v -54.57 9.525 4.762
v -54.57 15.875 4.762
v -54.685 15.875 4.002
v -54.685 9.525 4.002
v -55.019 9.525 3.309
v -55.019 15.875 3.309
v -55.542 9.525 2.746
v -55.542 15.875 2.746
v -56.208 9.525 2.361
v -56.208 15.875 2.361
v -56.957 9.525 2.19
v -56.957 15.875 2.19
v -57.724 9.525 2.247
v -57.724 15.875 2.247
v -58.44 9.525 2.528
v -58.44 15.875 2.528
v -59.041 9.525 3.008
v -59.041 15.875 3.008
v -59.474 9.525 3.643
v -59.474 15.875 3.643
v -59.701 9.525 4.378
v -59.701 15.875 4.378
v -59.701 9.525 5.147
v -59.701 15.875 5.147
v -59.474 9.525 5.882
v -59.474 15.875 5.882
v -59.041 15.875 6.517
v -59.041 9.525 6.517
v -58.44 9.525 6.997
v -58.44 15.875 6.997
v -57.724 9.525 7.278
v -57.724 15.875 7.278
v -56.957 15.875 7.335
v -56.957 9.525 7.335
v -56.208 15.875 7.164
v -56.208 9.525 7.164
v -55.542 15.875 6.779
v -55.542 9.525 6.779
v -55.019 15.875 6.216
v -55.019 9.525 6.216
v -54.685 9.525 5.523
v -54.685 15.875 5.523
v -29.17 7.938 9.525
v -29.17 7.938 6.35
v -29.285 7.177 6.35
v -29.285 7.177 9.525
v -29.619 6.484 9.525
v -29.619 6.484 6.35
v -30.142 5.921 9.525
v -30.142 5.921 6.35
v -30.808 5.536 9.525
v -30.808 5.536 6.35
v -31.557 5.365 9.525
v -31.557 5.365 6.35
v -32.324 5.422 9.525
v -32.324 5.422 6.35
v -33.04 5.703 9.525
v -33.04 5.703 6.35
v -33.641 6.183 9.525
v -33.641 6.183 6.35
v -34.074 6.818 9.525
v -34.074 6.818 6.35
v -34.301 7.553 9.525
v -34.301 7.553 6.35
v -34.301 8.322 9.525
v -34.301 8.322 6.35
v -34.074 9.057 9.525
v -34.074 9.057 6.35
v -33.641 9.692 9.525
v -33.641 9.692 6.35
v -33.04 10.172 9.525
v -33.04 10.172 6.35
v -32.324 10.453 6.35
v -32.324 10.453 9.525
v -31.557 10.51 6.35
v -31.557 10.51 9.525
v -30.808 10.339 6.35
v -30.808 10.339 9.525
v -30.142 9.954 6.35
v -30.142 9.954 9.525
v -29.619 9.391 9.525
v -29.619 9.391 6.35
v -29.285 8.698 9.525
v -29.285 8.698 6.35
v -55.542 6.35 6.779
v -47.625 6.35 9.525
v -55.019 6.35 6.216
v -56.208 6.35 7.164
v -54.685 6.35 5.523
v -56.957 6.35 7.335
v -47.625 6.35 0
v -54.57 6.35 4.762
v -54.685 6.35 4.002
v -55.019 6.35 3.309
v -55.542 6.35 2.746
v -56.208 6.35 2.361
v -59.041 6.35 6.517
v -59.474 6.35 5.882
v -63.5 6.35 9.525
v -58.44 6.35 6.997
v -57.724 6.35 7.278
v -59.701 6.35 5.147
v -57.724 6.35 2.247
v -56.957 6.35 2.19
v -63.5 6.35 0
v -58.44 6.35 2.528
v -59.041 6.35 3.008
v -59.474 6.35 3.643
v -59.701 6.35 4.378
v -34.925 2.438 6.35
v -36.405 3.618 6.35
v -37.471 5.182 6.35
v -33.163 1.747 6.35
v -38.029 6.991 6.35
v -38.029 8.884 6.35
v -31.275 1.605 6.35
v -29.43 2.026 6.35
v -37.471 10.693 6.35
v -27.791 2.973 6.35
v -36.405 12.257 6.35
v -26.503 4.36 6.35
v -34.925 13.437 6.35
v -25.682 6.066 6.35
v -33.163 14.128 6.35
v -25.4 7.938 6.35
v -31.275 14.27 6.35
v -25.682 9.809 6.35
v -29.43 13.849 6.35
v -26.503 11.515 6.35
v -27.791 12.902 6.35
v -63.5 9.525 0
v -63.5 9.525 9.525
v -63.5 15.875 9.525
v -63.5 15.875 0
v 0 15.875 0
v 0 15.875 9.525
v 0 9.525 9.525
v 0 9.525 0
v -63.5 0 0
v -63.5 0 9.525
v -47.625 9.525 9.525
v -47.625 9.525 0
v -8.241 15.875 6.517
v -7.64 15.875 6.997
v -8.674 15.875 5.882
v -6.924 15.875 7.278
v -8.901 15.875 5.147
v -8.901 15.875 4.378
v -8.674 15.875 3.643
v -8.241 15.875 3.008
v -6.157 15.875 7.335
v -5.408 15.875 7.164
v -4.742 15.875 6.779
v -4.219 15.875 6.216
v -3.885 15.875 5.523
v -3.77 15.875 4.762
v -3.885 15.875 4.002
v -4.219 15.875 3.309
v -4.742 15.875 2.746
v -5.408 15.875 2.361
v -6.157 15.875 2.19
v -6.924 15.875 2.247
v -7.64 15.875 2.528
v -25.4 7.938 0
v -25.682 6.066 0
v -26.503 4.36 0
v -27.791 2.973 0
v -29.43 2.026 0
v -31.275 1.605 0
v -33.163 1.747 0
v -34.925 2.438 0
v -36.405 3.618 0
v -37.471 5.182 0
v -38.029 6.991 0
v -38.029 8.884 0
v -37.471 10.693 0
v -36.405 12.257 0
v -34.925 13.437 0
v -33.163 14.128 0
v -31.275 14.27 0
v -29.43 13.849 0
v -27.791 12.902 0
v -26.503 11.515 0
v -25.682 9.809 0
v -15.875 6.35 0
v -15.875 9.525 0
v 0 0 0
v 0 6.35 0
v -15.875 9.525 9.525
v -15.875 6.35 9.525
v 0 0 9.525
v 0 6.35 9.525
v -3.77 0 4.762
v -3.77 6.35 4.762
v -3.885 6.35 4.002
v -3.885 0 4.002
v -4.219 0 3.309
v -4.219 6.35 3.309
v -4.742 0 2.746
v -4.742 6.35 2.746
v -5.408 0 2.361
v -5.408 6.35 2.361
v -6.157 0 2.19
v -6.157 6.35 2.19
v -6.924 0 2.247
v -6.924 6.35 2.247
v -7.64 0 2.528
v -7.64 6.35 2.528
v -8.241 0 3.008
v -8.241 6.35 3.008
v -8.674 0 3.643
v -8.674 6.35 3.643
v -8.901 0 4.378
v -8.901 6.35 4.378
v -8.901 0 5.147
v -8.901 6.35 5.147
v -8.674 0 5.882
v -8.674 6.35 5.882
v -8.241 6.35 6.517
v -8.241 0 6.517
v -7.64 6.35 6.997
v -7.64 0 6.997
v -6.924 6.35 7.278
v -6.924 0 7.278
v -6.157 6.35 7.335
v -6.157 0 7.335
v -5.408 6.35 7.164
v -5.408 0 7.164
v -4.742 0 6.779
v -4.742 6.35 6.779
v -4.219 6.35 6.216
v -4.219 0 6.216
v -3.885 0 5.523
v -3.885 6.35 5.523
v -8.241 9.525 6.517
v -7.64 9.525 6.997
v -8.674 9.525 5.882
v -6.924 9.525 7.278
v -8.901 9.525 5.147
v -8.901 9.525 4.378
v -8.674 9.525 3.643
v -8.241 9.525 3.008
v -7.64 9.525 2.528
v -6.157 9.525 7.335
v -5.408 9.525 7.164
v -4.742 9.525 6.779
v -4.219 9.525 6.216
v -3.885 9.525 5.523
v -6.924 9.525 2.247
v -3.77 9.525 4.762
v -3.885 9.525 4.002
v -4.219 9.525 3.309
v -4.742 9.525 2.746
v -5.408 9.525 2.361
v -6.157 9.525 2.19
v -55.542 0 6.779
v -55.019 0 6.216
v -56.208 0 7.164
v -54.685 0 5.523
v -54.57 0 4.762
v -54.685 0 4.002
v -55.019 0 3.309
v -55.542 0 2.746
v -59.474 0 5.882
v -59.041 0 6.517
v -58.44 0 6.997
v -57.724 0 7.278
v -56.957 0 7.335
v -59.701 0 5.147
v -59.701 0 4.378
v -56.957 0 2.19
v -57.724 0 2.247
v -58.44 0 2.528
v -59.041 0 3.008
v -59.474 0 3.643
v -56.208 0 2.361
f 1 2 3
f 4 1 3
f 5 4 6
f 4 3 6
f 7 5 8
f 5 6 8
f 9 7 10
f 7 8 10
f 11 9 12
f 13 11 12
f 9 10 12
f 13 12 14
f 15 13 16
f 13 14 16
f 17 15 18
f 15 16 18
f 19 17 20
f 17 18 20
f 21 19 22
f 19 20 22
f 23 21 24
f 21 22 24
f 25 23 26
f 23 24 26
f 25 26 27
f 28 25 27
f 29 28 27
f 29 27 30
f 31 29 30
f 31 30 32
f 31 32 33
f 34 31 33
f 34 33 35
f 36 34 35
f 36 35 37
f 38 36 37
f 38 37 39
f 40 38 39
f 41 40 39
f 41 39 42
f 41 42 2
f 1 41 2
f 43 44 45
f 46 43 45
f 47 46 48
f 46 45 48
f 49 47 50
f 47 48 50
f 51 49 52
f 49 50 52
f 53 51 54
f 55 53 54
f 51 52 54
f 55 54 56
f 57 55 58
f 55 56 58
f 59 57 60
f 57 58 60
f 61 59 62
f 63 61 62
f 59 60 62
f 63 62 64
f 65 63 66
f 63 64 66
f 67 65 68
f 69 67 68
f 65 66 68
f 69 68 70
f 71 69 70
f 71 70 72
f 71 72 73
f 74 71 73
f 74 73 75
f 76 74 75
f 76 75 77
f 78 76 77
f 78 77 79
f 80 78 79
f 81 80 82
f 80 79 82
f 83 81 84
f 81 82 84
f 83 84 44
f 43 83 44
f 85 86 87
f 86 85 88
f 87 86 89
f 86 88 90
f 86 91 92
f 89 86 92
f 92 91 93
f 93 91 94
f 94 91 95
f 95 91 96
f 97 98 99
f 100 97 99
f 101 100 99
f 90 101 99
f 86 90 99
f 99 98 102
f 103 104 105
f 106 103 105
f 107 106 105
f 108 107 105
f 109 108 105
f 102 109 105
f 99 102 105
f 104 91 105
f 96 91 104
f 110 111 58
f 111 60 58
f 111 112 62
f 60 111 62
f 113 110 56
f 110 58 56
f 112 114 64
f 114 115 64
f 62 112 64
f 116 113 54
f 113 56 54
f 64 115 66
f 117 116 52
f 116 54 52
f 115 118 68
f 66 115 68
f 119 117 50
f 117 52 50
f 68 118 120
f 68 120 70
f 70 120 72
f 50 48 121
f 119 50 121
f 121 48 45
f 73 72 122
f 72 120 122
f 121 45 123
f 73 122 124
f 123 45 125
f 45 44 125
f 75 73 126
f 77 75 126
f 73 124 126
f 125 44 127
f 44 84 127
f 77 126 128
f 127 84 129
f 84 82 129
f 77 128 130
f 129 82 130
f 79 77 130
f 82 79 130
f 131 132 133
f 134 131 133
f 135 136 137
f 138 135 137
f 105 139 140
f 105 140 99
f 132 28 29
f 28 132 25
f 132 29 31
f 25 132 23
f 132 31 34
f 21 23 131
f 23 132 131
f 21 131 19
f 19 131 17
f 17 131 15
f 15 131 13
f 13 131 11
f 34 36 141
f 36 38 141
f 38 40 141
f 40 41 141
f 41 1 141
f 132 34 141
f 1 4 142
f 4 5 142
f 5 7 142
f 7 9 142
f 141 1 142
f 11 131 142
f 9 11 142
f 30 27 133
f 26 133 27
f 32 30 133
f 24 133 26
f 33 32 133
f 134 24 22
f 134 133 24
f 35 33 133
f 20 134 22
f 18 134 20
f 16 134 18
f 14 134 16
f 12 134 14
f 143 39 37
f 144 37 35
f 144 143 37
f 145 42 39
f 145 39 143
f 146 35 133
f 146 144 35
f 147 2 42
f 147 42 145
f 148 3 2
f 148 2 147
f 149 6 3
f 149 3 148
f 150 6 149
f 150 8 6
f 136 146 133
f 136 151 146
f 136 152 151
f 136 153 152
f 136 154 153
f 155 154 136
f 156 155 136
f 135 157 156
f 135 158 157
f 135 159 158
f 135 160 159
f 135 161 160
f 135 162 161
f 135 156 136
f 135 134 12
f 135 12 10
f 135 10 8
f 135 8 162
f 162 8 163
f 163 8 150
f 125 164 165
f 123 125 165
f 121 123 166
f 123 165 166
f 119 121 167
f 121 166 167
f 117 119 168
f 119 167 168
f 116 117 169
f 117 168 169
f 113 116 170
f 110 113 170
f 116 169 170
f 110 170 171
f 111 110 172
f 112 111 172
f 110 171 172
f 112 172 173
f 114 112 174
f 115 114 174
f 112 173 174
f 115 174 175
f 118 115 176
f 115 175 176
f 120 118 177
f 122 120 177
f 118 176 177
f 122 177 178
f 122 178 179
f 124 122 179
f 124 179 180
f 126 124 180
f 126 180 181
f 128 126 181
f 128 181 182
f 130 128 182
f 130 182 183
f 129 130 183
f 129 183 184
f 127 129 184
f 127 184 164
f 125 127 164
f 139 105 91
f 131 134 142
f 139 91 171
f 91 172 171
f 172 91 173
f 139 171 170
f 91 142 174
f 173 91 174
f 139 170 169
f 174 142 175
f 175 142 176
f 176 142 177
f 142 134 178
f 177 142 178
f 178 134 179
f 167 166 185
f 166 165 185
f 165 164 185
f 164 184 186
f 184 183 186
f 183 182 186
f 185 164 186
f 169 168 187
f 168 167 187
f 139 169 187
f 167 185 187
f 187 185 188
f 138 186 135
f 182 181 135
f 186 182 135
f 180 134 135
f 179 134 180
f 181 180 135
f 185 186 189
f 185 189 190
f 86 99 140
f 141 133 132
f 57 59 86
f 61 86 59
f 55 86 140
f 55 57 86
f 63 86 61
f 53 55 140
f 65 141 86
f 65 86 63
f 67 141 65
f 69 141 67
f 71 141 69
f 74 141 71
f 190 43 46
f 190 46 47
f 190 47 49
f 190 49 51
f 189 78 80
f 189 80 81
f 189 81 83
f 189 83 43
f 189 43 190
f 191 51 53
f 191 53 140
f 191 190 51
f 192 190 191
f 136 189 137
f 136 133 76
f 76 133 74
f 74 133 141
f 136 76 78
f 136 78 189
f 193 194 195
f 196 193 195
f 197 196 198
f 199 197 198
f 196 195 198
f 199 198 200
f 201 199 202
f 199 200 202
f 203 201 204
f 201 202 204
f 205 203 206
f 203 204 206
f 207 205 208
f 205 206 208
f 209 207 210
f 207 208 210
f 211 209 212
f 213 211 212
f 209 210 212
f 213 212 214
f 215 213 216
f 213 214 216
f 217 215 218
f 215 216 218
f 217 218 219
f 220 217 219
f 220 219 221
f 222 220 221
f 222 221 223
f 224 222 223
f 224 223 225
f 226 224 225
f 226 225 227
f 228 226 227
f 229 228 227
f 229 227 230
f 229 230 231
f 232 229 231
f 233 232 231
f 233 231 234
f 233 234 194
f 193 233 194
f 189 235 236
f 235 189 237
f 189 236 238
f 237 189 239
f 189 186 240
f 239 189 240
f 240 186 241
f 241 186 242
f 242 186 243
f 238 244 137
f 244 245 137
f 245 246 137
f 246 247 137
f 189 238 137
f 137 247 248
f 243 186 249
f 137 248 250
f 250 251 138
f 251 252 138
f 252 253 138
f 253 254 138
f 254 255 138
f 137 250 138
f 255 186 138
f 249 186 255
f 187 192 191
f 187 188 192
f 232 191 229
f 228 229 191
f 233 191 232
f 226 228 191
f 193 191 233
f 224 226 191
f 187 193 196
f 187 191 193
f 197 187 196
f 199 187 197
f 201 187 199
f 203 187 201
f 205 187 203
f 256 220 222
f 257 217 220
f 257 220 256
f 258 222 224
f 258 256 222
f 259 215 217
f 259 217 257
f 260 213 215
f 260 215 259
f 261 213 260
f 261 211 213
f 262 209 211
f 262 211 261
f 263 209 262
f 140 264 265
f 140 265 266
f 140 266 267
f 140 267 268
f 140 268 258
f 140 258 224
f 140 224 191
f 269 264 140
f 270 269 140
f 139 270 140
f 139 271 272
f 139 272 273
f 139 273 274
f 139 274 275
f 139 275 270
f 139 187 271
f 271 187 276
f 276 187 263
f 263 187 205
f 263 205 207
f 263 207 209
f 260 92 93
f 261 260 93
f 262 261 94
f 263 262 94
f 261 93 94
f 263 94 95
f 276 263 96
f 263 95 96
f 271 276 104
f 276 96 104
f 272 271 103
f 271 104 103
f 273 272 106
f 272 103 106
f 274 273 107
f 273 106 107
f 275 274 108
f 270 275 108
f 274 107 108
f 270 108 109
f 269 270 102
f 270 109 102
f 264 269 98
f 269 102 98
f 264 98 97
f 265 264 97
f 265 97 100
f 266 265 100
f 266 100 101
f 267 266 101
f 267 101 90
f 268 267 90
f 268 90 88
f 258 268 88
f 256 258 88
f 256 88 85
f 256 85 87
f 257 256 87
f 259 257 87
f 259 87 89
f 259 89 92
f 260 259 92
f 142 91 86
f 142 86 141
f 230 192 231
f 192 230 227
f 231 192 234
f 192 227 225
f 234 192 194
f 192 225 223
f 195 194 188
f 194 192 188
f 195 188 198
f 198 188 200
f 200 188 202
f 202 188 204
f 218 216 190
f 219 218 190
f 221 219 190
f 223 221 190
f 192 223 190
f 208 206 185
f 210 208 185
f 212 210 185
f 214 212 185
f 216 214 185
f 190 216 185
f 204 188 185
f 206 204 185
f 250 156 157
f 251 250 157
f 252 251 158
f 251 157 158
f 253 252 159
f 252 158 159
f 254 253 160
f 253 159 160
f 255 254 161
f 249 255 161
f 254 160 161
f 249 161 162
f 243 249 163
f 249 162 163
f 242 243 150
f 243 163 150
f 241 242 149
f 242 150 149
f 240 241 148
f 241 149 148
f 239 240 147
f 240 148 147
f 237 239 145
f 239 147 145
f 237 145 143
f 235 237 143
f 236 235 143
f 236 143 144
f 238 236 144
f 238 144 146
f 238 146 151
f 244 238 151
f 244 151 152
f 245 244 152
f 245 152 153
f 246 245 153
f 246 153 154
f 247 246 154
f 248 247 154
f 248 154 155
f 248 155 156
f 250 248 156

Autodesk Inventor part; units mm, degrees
ref_plane "YZ Plane" through (0, 0, 0) normal (1, 0, 0) x (0, 1, 0)
ref_plane "XZ Plane" through (0, 0, 0) normal (0, 1, 0) x (-1, 0, 0)
ref_plane "XY Plane" through (0, 0, 0) normal (0, 0, 1) x (1, 0, 0)
sketch "Sketch1" plane through (0, 0, 0) normal (0, 0, 1) x (1, 0, 0)
  line L0 (0, 0) -> (-63.5, 0)
  line L1 (-63.5, 0) -> (-63.5, 15.875)
  line L2 (-63.5, 15.875) -> (0, 15.875)
  line L3 (0, 15.875) -> (0, 0)
  line L4 (0, 6.35) -> (-63.5, 6.35)
  line L5 (-63.5, 6.35) -> (-63.5, 9.525)
  line L6 (-63.5, 9.525) -> (0, 9.525)
  line L7 (0, 9.525) -> (0, 6.35)
  line L8 (-47.625, 15.875) -> (-15.875, 15.875)
  line L9 (-15.875, 15.875) -> (-15.875, 0)
  line L10 (-15.875, 0) -> (-47.625, 0)
  line L11 (-47.625, 0) -> (-47.625, 15.875)
  circle A0 centre (-31.75, 7.9375) radius 6.35
  circle A1 centre (-31.75, 7.9375) radius 2.5797
  line L12 (-6.35, 6.35) -> (-6.35, 9.525)
  line L13 (-57.15, 6.35) -> (-57.15, 9.525)
  point P0 (-15.875, 6.35)
  point P1 (-15.875, 9.525)
  point P2 (-47.625, 9.525)
  point P3 (-47.625, 6.35)
  dimension "d12" = 15.875
  dimension "d13" = 6.35
  dimension "d14" = 3.175
  dimension "d15" = 15.875
  dimension "d16" = 15.875
  dimension "d17" = 7.9375
  dimension "d18" = 31.75
  dimension "d19" = 12.7
  dimension "d20" = 5.1594
  dimension "d33" = 6.35
  dimension "d34" = 6.35
  dimension "d35" = 50.8
  dimension "d36" = 63.5
extrude "Extrusion1" add sketch "Sketch1" along normal blind 9.525 contours L0 L9 L4 L3 | L0 L11 L4 A0 L9 | L0 L1 L4 L11 | L4 A0 L6 L9 | L6 L9 L2 L3 | L11 L6 A0 L4 | A0 L4 A1 | L4 A1 L6 A0 | L6 A0 L11 L2 L9 | A0 L6 A1 L4 | L6 L1 L2 L11 | L6 A1 A0
extrude "Extrusion2" cut sketch "Sketch1" along normal blind 6.35 contours A0 L4 A1 | L4 A1 L6 A0 | A0 L6 A1 L4 | A1 L4 | L4 A1 L6 | L6 A1 A0 | L6 A1
sketch "Sketch2" plane through (-63.5, 15.875, 0) normal (0, 1, 0) x (1, 0, 0)
  circle A0 centre (57.15, -4.7625) radius 2.5797
  circle A1 centre (6.35, -4.7625) radius 2.5797
  line L0 (63.5, 0) -> (0, 0) projected
  line L1 (63.5, 0) -> (63.5, -9.525) projected
  line L2 (0, 0) -> (0, -9.525) projected
  dimension "d25" = 4.7625
  dimension "d26" = 4.7625
  dimension "d27" = 6.35
  dimension "d28" = 6.35
  dimension "d29" = 5.1594
extrude "Extrusion3" cut sketch "Sketch2" against normal through all
equation "\"d16\" = d15"
equation "\"d17\" = 0.5 * d12"
equation "\"d18\" = 0.5 * d36"
equation "\"d33\" = d34"
equation "\"d34\" = d13"
equation "\"d26\" = d25"
equation "\"d27\" = d28"
properties part number "Connector"
